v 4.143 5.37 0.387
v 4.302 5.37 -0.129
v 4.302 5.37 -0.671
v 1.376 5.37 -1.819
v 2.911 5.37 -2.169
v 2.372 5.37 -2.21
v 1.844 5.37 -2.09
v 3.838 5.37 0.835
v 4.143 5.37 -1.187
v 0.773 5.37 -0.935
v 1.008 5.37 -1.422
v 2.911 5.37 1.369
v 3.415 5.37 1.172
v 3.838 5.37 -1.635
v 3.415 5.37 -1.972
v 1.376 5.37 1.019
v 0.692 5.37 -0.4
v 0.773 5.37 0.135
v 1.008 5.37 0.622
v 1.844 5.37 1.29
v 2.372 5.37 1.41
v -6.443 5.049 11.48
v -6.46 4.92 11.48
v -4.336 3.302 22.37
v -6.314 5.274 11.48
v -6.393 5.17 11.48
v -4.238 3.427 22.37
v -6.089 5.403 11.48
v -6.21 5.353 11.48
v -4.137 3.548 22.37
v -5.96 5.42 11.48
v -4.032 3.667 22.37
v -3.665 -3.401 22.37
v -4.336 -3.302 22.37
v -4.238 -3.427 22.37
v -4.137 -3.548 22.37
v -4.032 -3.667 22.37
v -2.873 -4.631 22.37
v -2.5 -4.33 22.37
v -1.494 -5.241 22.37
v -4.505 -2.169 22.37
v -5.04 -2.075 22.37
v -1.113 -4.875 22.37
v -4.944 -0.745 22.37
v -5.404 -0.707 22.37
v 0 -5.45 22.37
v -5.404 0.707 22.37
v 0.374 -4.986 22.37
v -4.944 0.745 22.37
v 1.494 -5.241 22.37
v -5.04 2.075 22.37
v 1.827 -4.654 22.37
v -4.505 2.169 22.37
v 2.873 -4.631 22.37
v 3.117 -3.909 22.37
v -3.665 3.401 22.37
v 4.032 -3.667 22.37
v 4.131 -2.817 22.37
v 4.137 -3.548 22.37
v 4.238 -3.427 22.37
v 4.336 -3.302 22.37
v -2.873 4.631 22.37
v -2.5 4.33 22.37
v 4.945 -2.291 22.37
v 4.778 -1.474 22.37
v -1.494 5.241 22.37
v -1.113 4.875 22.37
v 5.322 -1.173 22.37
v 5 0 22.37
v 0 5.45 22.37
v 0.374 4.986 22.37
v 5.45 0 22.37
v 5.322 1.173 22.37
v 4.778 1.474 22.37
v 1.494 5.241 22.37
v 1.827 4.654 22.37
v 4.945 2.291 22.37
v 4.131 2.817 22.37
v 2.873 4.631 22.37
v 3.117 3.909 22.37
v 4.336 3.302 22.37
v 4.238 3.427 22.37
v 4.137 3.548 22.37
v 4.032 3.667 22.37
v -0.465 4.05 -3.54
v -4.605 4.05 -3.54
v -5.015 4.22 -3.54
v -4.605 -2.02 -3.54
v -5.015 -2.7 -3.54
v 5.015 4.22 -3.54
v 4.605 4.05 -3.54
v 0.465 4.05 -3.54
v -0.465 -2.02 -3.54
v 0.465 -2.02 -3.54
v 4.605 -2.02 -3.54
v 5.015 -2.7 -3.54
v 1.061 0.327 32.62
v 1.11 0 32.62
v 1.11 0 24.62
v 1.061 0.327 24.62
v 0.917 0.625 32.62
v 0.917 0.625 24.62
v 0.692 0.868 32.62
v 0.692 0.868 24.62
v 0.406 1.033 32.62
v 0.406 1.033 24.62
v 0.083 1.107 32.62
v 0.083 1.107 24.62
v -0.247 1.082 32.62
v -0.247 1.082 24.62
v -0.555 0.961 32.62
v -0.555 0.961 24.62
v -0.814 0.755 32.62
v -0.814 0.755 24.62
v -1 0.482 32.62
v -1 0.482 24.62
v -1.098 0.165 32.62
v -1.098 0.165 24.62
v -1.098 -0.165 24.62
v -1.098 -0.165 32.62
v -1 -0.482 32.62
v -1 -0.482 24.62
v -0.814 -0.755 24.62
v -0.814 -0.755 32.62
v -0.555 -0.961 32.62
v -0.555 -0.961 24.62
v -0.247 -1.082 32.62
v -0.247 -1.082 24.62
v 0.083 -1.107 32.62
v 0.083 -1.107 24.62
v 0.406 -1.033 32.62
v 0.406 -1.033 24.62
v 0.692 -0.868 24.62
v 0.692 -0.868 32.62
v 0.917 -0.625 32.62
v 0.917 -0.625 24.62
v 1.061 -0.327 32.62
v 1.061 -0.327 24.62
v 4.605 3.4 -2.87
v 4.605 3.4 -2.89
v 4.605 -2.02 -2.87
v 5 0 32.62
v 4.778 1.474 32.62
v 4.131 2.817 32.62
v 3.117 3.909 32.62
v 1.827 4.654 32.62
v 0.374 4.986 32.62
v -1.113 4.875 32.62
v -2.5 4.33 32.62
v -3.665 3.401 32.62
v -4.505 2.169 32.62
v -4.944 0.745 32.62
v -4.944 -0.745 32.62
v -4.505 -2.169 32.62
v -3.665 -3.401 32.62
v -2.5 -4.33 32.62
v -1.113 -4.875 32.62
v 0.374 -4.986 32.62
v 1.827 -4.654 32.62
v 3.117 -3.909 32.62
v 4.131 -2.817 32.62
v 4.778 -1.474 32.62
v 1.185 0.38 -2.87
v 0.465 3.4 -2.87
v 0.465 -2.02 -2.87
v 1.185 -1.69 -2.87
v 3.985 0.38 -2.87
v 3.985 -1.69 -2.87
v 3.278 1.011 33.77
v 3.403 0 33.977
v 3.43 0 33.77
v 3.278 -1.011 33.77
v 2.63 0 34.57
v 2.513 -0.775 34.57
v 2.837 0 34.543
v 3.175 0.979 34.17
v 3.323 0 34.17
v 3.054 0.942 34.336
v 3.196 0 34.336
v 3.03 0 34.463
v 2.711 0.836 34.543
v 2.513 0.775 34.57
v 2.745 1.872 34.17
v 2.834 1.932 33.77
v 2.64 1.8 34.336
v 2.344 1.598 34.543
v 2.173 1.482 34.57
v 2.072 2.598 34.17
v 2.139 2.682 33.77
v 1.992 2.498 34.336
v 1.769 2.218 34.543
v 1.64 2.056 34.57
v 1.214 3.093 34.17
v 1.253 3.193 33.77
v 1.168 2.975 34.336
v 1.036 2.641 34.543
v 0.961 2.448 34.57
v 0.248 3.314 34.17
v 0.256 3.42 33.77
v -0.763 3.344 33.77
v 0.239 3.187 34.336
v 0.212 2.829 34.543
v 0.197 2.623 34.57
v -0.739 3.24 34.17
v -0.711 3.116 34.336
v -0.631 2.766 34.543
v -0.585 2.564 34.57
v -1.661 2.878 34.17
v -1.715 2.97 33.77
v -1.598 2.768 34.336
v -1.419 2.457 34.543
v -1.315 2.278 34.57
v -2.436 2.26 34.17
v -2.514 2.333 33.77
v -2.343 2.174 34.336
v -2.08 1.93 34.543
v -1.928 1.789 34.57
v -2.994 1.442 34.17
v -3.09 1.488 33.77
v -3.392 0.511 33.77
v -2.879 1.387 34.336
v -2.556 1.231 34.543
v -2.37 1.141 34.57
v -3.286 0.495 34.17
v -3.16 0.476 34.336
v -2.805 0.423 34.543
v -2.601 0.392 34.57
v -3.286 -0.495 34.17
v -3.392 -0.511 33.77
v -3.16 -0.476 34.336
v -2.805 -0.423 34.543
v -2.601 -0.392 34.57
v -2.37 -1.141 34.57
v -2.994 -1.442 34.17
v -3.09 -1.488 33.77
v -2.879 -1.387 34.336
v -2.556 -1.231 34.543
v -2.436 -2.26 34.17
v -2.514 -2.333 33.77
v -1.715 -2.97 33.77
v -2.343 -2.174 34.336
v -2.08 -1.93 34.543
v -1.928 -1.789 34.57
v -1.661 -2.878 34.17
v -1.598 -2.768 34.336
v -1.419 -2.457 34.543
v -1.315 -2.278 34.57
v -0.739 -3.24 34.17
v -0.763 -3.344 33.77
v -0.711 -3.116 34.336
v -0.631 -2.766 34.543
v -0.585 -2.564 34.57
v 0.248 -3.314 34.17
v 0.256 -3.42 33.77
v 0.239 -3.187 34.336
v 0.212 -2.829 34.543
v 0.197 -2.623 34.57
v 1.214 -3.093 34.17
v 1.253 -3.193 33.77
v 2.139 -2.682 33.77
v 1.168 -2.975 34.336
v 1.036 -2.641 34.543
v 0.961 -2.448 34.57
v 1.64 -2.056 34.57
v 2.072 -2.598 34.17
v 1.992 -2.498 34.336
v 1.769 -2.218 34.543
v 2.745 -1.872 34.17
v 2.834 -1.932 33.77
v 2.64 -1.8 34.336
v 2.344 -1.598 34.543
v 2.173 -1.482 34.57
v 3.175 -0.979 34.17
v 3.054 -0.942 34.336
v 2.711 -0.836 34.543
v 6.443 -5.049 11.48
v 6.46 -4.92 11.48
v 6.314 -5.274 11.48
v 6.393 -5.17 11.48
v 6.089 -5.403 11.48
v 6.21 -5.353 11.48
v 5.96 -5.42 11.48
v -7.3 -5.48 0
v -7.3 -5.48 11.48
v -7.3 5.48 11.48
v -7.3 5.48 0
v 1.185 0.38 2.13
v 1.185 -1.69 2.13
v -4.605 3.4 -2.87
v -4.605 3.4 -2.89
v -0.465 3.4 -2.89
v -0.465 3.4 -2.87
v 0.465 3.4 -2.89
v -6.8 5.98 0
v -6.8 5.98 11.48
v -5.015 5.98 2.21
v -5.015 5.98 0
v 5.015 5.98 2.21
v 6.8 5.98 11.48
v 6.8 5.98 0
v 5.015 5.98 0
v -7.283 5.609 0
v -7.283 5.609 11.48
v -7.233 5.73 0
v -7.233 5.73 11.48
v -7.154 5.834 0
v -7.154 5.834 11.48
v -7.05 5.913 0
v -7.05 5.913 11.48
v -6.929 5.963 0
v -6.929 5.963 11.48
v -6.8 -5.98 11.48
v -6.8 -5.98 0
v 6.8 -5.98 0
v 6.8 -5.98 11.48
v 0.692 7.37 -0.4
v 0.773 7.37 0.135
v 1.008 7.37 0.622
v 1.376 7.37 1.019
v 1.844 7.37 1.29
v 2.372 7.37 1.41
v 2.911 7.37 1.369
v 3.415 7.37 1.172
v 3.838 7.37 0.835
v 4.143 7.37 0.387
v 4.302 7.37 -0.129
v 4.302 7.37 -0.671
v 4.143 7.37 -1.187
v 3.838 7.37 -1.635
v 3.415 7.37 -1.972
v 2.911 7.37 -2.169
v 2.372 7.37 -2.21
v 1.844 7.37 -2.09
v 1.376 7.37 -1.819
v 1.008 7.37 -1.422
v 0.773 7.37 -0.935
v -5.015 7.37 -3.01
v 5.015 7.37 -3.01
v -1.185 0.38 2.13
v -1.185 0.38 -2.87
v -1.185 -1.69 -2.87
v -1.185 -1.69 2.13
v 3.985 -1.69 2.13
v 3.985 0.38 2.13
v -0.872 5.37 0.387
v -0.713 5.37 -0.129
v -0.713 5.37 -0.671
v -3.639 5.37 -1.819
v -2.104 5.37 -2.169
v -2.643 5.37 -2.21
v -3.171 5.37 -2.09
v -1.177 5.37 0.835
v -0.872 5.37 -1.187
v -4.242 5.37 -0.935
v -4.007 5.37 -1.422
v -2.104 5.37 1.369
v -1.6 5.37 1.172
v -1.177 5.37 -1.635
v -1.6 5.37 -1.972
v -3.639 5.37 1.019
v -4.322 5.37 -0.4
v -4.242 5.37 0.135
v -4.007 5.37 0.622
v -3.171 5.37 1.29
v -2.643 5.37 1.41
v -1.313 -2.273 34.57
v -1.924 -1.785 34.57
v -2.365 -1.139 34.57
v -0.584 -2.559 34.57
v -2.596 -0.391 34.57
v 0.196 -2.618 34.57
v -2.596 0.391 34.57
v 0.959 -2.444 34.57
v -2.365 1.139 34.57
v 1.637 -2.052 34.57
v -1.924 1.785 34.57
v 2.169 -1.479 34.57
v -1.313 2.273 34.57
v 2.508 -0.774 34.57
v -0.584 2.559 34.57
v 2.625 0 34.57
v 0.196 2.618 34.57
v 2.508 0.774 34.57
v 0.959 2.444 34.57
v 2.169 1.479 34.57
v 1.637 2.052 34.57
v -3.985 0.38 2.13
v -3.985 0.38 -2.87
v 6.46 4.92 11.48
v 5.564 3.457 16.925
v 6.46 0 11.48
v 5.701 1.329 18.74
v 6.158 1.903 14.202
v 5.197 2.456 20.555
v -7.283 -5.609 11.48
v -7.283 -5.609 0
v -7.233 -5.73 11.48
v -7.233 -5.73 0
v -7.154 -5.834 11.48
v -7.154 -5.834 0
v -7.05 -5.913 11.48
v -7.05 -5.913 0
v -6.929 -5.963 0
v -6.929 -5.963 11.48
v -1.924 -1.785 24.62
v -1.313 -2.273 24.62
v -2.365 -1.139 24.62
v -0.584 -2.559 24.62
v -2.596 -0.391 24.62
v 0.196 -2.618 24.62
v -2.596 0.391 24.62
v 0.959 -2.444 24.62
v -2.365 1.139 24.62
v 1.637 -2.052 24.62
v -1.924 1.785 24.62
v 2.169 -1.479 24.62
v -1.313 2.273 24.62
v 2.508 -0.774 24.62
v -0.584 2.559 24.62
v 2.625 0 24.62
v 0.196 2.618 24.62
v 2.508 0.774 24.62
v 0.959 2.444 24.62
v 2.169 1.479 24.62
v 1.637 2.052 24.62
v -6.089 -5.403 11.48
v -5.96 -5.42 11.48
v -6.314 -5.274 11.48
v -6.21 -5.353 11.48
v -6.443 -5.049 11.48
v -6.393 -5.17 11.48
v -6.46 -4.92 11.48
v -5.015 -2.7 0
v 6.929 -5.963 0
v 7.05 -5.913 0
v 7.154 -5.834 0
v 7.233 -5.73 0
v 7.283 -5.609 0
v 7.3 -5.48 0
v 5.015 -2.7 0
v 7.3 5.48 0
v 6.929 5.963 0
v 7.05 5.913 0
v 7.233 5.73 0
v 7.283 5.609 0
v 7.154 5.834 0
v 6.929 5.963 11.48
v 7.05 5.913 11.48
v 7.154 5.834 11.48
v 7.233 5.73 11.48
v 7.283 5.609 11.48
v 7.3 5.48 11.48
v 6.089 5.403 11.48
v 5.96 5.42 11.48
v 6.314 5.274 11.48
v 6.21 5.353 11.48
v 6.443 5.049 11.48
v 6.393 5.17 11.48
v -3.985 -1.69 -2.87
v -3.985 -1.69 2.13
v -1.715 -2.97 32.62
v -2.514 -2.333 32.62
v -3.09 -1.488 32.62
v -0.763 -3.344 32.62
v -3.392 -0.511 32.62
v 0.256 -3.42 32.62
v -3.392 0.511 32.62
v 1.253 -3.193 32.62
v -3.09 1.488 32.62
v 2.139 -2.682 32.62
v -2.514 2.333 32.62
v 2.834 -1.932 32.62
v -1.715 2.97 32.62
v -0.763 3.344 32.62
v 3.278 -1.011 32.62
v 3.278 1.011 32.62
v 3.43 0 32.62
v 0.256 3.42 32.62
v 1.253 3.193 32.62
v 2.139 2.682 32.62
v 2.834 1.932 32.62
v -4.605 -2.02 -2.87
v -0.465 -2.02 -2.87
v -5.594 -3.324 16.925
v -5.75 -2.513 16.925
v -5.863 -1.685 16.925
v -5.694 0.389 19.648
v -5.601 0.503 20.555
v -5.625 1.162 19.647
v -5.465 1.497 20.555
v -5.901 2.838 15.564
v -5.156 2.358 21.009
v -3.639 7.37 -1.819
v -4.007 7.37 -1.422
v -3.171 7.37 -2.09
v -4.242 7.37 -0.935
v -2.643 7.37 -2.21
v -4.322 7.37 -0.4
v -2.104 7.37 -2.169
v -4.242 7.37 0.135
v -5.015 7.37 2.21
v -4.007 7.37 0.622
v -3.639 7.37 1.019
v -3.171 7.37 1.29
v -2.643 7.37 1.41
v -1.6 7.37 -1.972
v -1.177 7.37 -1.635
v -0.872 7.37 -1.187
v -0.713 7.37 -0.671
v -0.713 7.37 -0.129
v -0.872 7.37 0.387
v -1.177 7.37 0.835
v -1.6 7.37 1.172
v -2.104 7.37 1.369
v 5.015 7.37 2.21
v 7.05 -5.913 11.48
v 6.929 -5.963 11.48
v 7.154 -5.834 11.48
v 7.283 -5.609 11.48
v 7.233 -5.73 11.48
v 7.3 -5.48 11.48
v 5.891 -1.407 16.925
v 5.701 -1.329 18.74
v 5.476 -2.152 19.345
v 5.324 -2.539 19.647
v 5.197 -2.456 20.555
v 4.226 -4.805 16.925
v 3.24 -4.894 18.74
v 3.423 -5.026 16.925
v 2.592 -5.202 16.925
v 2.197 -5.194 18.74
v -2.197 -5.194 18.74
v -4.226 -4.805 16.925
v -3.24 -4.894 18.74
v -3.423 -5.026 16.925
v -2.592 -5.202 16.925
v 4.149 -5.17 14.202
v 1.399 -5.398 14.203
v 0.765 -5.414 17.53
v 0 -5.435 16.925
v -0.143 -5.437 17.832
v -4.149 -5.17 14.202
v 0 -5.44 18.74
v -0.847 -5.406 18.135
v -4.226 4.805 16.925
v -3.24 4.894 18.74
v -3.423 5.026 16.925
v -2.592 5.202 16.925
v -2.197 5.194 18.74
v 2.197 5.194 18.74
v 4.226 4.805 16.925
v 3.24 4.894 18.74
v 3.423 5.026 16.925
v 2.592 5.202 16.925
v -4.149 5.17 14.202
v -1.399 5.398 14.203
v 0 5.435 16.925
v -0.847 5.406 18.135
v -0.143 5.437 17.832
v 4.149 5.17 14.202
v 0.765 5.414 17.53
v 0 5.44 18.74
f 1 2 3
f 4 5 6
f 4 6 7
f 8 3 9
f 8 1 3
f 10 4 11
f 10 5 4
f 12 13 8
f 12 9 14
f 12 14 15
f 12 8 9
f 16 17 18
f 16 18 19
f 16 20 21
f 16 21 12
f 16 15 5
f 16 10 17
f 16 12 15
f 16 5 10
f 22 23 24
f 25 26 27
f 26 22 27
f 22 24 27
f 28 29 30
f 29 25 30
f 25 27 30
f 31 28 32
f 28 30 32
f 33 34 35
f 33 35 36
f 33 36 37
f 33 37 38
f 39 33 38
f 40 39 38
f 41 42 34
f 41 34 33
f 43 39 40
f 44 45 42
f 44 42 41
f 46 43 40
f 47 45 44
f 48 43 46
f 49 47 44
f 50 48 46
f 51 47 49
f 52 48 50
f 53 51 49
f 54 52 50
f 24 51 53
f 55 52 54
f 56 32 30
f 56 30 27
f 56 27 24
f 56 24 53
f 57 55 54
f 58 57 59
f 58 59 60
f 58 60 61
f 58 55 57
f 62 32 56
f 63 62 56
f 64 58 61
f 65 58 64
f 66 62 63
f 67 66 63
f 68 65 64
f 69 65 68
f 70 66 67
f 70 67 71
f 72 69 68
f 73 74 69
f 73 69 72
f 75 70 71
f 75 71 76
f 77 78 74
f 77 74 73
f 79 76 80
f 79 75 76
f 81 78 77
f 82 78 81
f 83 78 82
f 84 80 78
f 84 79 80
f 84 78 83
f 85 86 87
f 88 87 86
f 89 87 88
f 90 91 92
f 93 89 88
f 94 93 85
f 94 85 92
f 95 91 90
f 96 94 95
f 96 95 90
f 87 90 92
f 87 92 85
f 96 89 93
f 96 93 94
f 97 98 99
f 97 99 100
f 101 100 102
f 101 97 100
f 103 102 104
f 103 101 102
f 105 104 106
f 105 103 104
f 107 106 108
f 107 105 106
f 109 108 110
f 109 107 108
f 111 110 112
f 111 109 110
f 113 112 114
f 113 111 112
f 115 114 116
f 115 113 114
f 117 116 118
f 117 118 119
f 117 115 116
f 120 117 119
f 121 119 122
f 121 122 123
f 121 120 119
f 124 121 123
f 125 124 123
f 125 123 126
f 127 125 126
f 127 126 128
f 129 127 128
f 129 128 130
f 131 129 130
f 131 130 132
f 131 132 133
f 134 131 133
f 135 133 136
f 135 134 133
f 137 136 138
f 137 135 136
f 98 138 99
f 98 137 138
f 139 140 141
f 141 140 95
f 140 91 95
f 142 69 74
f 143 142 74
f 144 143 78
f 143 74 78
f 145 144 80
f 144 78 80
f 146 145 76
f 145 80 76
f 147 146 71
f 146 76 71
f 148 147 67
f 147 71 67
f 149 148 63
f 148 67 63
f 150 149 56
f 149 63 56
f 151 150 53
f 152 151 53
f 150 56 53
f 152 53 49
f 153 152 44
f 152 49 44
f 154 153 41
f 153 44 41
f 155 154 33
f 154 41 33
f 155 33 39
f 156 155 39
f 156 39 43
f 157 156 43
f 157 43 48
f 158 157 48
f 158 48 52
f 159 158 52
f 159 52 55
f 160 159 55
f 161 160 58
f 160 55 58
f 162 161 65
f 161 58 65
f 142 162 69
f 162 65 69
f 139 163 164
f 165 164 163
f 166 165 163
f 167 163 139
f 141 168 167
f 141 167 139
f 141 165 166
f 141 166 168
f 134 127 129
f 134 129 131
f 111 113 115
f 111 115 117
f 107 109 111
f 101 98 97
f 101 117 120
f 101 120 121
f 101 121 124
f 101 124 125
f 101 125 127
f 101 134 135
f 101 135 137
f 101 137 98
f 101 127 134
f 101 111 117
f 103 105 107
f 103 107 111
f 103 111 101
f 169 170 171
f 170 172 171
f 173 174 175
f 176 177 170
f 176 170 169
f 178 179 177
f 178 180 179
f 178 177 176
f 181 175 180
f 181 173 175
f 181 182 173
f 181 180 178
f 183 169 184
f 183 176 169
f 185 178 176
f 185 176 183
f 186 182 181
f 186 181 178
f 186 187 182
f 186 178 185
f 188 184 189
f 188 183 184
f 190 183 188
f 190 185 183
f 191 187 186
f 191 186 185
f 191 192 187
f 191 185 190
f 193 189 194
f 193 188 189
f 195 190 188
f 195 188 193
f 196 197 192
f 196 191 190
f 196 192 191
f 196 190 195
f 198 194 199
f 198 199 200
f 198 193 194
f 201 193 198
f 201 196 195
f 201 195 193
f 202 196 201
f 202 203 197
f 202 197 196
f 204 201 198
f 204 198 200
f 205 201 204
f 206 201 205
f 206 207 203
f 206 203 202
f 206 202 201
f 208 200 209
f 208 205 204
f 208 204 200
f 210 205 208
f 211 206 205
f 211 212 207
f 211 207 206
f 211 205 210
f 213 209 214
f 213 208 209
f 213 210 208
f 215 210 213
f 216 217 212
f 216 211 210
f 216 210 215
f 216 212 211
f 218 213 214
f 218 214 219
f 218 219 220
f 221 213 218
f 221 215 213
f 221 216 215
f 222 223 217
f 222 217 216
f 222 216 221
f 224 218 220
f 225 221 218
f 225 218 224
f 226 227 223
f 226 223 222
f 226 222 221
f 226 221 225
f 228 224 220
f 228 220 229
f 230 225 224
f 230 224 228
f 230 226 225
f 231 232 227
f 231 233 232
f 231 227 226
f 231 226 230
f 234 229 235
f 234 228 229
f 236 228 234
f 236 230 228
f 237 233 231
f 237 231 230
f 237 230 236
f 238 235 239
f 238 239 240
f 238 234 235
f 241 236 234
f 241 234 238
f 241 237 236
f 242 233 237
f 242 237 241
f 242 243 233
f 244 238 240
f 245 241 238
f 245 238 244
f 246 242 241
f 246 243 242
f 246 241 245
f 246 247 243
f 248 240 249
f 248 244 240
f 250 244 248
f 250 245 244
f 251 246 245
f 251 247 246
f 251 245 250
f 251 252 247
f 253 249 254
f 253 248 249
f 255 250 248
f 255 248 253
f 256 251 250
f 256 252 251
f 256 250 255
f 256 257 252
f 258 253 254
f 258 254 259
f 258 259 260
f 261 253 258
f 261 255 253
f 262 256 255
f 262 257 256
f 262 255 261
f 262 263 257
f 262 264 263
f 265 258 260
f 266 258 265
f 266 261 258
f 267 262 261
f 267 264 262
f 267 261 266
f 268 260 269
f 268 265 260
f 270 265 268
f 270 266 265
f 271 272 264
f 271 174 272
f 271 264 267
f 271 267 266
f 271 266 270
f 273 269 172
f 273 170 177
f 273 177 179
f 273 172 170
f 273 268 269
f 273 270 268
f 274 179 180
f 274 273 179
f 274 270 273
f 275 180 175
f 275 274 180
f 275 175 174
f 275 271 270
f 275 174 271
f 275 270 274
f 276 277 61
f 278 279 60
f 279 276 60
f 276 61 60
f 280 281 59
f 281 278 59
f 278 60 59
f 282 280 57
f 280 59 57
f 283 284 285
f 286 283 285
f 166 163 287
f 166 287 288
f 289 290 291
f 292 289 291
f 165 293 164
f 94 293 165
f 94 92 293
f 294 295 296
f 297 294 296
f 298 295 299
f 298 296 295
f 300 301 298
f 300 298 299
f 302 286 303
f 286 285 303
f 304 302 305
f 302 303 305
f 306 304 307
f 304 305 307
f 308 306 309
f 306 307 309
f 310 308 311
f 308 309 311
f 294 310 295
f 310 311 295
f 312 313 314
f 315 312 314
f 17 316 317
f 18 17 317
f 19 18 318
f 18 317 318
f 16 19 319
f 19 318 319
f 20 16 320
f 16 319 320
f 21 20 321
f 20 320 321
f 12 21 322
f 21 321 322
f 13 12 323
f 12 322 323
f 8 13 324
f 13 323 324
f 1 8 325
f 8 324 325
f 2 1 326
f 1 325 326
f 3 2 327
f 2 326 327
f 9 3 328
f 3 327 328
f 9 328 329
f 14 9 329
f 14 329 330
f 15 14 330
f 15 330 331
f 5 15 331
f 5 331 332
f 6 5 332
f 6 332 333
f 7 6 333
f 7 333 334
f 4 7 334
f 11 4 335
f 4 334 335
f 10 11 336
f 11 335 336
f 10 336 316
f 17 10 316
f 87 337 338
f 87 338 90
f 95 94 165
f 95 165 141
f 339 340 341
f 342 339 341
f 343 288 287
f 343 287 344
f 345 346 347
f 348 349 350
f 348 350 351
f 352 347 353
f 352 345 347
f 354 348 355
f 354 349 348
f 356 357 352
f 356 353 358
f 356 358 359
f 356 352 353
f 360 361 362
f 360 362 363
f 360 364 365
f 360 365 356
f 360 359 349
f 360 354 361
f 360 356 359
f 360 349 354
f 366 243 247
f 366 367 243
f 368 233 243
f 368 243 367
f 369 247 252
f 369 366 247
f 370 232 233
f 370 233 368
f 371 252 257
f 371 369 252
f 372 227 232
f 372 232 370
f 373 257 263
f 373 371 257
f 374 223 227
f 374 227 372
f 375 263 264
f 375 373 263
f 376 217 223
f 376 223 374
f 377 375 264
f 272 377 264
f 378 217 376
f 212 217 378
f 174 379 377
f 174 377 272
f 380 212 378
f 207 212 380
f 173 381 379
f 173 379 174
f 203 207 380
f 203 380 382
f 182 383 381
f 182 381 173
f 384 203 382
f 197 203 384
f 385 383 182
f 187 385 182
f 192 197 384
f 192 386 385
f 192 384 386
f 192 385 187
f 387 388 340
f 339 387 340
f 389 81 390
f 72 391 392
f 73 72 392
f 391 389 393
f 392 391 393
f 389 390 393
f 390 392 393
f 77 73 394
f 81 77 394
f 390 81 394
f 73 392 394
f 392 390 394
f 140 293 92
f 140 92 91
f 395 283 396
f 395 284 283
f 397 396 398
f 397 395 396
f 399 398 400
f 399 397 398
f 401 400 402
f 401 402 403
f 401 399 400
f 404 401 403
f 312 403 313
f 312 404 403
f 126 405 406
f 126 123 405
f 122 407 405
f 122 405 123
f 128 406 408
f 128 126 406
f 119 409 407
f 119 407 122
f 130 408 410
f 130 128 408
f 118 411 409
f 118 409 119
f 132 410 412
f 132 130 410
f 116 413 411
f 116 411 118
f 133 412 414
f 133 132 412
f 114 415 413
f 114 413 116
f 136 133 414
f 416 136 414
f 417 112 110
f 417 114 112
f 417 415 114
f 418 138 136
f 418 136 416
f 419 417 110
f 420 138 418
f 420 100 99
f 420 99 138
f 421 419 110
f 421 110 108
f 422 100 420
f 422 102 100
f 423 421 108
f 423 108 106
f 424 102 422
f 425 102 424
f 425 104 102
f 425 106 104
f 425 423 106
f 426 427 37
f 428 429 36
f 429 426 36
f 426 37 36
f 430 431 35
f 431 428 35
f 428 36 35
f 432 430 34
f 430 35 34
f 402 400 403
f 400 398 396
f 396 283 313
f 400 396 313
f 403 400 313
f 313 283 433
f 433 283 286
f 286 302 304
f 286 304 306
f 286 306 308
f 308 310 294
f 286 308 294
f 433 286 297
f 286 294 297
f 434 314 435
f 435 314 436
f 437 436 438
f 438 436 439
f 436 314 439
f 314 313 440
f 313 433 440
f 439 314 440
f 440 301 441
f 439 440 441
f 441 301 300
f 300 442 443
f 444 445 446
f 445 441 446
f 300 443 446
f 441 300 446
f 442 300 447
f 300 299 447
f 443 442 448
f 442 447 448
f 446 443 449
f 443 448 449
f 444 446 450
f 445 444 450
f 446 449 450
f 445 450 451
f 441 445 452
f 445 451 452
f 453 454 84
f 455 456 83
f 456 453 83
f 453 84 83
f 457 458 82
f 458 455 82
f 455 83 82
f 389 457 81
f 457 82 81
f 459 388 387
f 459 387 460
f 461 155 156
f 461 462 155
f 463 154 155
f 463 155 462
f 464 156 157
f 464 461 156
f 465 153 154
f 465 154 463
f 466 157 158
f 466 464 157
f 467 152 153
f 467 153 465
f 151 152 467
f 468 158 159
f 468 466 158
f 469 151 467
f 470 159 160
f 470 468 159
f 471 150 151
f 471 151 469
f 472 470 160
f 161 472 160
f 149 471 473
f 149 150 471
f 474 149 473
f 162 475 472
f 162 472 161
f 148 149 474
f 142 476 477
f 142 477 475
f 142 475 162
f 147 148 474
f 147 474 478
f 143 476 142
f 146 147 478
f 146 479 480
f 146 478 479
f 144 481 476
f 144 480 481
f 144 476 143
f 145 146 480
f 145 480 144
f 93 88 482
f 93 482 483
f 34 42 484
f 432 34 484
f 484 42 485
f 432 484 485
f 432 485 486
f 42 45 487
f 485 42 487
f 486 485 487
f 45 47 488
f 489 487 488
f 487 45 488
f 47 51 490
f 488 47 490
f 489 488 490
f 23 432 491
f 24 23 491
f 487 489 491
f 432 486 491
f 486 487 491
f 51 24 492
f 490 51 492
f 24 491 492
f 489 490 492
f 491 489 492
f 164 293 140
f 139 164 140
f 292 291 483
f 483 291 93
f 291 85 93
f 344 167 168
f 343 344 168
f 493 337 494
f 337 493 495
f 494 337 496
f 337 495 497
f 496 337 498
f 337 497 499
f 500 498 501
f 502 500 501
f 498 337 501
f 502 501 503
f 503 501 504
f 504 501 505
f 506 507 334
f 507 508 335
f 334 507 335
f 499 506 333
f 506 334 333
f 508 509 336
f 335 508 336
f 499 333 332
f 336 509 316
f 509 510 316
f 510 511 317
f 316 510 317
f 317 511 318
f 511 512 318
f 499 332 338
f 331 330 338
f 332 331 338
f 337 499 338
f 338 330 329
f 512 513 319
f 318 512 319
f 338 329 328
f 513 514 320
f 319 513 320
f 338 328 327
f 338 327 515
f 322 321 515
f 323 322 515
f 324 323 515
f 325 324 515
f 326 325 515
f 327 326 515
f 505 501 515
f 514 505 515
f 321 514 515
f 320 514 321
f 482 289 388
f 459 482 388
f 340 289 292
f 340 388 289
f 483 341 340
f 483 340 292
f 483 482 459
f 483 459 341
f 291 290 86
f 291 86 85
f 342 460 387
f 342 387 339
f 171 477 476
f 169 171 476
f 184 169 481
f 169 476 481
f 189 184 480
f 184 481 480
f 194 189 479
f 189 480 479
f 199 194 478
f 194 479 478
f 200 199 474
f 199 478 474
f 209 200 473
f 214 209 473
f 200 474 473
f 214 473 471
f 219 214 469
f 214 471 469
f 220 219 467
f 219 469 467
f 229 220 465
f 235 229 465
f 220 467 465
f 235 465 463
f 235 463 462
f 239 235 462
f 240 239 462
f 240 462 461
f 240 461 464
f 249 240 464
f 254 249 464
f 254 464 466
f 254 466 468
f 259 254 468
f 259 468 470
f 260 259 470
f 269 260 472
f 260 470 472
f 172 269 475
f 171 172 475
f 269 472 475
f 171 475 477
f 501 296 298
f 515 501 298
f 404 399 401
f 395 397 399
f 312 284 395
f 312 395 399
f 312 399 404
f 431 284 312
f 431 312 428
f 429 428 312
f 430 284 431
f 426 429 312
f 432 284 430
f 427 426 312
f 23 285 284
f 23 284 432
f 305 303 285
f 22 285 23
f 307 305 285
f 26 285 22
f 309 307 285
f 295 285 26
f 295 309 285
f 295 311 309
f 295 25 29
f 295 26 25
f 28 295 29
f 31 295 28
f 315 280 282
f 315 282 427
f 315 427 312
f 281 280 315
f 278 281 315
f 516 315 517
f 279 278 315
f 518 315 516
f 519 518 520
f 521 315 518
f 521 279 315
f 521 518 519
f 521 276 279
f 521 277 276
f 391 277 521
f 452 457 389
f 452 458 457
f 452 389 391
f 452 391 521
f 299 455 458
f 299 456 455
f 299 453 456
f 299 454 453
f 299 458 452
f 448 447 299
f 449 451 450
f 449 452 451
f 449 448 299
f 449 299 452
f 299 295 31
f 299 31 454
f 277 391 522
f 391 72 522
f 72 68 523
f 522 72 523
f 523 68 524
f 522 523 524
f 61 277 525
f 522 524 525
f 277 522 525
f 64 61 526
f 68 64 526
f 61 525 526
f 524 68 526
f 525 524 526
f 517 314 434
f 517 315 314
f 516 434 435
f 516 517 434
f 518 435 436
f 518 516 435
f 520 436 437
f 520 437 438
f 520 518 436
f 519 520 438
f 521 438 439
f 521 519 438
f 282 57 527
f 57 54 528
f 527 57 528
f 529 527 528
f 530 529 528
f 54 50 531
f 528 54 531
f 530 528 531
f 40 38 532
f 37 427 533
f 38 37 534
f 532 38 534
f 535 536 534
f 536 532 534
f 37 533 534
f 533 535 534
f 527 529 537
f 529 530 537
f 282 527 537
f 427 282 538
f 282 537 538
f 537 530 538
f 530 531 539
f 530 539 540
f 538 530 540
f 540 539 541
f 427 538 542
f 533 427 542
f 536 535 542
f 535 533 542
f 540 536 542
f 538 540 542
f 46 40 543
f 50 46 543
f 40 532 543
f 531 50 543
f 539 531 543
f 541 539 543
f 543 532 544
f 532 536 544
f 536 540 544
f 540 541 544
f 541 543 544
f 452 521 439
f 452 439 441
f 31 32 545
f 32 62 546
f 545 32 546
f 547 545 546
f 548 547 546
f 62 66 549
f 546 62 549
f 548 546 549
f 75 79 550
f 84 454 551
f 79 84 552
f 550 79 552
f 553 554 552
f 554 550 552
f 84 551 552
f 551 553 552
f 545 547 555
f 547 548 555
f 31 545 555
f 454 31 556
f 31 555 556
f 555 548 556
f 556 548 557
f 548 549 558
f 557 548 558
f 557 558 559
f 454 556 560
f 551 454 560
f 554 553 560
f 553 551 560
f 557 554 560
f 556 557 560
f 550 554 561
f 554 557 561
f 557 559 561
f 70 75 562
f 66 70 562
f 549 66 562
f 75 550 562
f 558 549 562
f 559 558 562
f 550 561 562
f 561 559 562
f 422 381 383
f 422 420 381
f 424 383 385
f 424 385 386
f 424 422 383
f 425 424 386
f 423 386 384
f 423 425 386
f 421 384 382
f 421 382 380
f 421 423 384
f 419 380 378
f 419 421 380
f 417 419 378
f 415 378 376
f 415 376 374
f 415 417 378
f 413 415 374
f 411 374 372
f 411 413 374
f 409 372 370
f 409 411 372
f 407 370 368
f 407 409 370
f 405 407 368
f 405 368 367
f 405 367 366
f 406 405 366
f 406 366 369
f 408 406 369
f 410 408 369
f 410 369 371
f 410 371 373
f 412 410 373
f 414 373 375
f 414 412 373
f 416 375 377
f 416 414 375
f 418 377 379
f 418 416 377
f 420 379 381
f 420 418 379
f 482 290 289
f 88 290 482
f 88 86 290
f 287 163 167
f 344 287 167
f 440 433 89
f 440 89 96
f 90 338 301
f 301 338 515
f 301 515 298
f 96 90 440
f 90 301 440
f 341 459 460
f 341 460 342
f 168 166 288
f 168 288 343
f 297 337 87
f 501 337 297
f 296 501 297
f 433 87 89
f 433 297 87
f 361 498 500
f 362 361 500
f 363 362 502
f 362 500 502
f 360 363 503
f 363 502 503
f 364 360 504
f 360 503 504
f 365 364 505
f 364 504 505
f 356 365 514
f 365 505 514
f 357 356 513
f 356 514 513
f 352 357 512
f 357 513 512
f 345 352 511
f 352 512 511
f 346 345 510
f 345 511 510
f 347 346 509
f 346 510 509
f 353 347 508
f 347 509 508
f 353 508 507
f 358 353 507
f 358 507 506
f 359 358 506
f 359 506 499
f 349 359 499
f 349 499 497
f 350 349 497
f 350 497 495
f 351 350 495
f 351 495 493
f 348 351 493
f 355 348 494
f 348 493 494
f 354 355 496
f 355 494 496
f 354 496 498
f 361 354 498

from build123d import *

# Parameters (mm, degrees)
SKETCH002_R     = 5.45
SKETCH003_R     = 5
PAD001_DEPTH    = 10.25
SKETCH004_R     = 2.625
SKETCH004_R_2   = 1.11
POCKET_DEPTH    = 8
SKETCH005_R     = 3.43
SKETCH005_R_2   = 2.625
PAD002_DEPTH    = 1.95
FILLET_R        = 0.8
SKETCH_W        = 14.6
SKETCH_H        = 11.96
PAD_DEPTH       = 11.48
SKETCH006_W     = 10.03
SKETCH006_H     = 10.07
PAD003_DEPTH    = 5.75
POCKET001_DEPTH = 10.031
FILLET001_R     = 0.5
SKETCH008_R     = 1.815
POCKET002_DEPTH = 2
SKETCH009_W     = 4.14
SKETCH009_H     = 5.42
POCKET003_DEPTH = 0.67
CHAMFER_SIZE    = 0.65
SKETCH010_W     = 2.8
SKETCH010_H     = 2.07
POCKET004_DEPTH = 5


with BuildPart() as fillet_body:
    # Sketch001 → Loft section 0
    with BuildSketch(Plane.XY.offset(11.48)):
        with BuildLine():
            Line((-5.96, 5.42), (5.96, 5.42))
            ThreePointArc((6.46, 4.92), (6.313553, 5.273553), (5.96, 5.42))
            Line((6.46, 4.92), (6.46, -4.92))
            ThreePointArc((5.96, -5.42), (6.313553, -5.273553), (6.46, -4.92))
            Line((5.96, -5.42), (-5.96, -5.42))
            ThreePointArc((-6.46, -4.92), (-6.313553, -5.273553), (-5.96, -5.42))
            Line((-6.46, -4.92), (-6.46, 4.92))
            ThreePointArc((-5.96, 5.42), (-6.313553, 5.273553), (-6.46, 4.92))
        make_face()
    # Sketch002 → Loft section 1
    with BuildSketch(Plane.XY.offset(22.37)):
        Circle(SKETCH002_R)
    loft(ruled=True)

    # Sketch003 → Pad001 (new body)
    with BuildSketch(Plane.XY.offset(22.37)):
        Circle(SKETCH003_R)
    extrude(amount=PAD001_DEPTH)

    # Sketch004 → Pocket (cut)
    with BuildSketch(Plane.XY.offset(32.62)):
        Circle(SKETCH004_R)
        Circle(SKETCH004_R_2, mode=Mode.SUBTRACT)
    extrude(amount=-POCKET_DEPTH, mode=Mode.SUBTRACT)

    # Sketch005 → Pad002 (new body)
    with BuildSketch(Plane.XY.offset(32.62)):
        Circle(SKETCH005_R)
        Circle(SKETCH005_R_2, mode=Mode.SUBTRACT)
    extrude(amount=PAD002_DEPTH)

    # Fillet
    fillet_edges = [fillet_body.edges().sort_by_distance(p)[0] for p in [
        (-3.43, 0, 34.57),
    ]]
    fillet(fillet_edges, radius=FILLET_R)


with BuildPart() as fusion:
    # Sketch → Pad (new body)
    with BuildSketch(Plane.XY):
        Rectangle(SKETCH_W, SKETCH_H)
    extrude(amount=PAD_DEPTH)

    # Fusion: union Fillet body
    add(fillet_body.part)


with BuildPart() as alimfemelle:
    # Sketch006 → Pad003 (new body)
    with BuildSketch(Plane(origin=(0, 0, 2.21), x_dir=(1, 0, 0), z_dir=(0, 0, -1))):
        with Locations((0, -2.335)):
            Rectangle(SKETCH006_W, SKETCH006_H)
    extrude(amount=PAD003_DEPTH)

    # Sketch007 → Pocket001 (cut, through all)
    with BuildSketch(Plane(origin=(-5.015, 0, 2.21), x_dir=(0, 1, 0), z_dir=(-1, 0, 0))):
        Polygon((15, 3.936222), (0, 6.460032), (0, 8.936222), (15, 8.936222), align=None)
    extrude(amount=-POCKET001_DEPTH, mode=Mode.SUBTRACT)

    # Fusion001: union Fusion
    add(fusion.part)

    # Fillet001
    fillet001_edges = [alimfemelle.edges().sort_by_distance(p)[0] for p in [
        (7.3, 5.98, 5.74),
        (-7.3, 5.98, 5.74),
        (7.3, -5.98, 5.74),
        (-7.3, -5.98, 5.74),
    ]]
    fillet(fillet001_edges, radius=FILLET001_R)

    # Sketch008 → Pocket002 (cut)
    with BuildSketch(Plane(origin=(0, 7.37, 0), x_dir=(-1, 0, 0), z_dir=(0, 1, 0))):
        with Locations((-2.5075, -0.4)):
            Circle(SKETCH008_R)
        with Locations((2.5075, -0.4)):
            Circle(SKETCH008_R)
    extrude(amount=-POCKET002_DEPTH, mode=Mode.SUBTRACT)

    # Sketch009 → Pocket003 (cut)
    with BuildSketch(Plane(origin=(0, 0, -3.54), x_dir=(1, 0, 0), z_dir=(0, 0, -1))):
        with Locations((-2.535, -0.69)):
            Rectangle(SKETCH009_W, SKETCH009_H)
        with Locations((2.535, -0.69)):
            Rectangle(SKETCH009_W, SKETCH009_H)
    extrude(amount=-POCKET003_DEPTH, mode=Mode.SUBTRACT)

    # Chamfer
    chamfer_edges = [alimfemelle.edges().sort_by_distance(p)[0] for p in [
        (2.535, 3.4, -3.54),
        (-2.535, 3.4, -3.54),
    ]]
    chamfer(chamfer_edges, length=CHAMFER_SIZE)

    # Sketch010 → Pocket004 (cut)
    with BuildSketch(Plane(origin=(0, 0, -2.87), x_dir=(1, 0, 0), z_dir=(0, 0, -1))):
        with Locations((-2.585, 0.655)):
            Rectangle(SKETCH010_W, SKETCH010_H)
        with Locations((2.585, 0.655)):
            Rectangle(SKETCH010_W, SKETCH010_H)
    extrude(amount=-POCKET004_DEPTH, mode=Mode.SUBTRACT)


solid = alimfemelle.part
